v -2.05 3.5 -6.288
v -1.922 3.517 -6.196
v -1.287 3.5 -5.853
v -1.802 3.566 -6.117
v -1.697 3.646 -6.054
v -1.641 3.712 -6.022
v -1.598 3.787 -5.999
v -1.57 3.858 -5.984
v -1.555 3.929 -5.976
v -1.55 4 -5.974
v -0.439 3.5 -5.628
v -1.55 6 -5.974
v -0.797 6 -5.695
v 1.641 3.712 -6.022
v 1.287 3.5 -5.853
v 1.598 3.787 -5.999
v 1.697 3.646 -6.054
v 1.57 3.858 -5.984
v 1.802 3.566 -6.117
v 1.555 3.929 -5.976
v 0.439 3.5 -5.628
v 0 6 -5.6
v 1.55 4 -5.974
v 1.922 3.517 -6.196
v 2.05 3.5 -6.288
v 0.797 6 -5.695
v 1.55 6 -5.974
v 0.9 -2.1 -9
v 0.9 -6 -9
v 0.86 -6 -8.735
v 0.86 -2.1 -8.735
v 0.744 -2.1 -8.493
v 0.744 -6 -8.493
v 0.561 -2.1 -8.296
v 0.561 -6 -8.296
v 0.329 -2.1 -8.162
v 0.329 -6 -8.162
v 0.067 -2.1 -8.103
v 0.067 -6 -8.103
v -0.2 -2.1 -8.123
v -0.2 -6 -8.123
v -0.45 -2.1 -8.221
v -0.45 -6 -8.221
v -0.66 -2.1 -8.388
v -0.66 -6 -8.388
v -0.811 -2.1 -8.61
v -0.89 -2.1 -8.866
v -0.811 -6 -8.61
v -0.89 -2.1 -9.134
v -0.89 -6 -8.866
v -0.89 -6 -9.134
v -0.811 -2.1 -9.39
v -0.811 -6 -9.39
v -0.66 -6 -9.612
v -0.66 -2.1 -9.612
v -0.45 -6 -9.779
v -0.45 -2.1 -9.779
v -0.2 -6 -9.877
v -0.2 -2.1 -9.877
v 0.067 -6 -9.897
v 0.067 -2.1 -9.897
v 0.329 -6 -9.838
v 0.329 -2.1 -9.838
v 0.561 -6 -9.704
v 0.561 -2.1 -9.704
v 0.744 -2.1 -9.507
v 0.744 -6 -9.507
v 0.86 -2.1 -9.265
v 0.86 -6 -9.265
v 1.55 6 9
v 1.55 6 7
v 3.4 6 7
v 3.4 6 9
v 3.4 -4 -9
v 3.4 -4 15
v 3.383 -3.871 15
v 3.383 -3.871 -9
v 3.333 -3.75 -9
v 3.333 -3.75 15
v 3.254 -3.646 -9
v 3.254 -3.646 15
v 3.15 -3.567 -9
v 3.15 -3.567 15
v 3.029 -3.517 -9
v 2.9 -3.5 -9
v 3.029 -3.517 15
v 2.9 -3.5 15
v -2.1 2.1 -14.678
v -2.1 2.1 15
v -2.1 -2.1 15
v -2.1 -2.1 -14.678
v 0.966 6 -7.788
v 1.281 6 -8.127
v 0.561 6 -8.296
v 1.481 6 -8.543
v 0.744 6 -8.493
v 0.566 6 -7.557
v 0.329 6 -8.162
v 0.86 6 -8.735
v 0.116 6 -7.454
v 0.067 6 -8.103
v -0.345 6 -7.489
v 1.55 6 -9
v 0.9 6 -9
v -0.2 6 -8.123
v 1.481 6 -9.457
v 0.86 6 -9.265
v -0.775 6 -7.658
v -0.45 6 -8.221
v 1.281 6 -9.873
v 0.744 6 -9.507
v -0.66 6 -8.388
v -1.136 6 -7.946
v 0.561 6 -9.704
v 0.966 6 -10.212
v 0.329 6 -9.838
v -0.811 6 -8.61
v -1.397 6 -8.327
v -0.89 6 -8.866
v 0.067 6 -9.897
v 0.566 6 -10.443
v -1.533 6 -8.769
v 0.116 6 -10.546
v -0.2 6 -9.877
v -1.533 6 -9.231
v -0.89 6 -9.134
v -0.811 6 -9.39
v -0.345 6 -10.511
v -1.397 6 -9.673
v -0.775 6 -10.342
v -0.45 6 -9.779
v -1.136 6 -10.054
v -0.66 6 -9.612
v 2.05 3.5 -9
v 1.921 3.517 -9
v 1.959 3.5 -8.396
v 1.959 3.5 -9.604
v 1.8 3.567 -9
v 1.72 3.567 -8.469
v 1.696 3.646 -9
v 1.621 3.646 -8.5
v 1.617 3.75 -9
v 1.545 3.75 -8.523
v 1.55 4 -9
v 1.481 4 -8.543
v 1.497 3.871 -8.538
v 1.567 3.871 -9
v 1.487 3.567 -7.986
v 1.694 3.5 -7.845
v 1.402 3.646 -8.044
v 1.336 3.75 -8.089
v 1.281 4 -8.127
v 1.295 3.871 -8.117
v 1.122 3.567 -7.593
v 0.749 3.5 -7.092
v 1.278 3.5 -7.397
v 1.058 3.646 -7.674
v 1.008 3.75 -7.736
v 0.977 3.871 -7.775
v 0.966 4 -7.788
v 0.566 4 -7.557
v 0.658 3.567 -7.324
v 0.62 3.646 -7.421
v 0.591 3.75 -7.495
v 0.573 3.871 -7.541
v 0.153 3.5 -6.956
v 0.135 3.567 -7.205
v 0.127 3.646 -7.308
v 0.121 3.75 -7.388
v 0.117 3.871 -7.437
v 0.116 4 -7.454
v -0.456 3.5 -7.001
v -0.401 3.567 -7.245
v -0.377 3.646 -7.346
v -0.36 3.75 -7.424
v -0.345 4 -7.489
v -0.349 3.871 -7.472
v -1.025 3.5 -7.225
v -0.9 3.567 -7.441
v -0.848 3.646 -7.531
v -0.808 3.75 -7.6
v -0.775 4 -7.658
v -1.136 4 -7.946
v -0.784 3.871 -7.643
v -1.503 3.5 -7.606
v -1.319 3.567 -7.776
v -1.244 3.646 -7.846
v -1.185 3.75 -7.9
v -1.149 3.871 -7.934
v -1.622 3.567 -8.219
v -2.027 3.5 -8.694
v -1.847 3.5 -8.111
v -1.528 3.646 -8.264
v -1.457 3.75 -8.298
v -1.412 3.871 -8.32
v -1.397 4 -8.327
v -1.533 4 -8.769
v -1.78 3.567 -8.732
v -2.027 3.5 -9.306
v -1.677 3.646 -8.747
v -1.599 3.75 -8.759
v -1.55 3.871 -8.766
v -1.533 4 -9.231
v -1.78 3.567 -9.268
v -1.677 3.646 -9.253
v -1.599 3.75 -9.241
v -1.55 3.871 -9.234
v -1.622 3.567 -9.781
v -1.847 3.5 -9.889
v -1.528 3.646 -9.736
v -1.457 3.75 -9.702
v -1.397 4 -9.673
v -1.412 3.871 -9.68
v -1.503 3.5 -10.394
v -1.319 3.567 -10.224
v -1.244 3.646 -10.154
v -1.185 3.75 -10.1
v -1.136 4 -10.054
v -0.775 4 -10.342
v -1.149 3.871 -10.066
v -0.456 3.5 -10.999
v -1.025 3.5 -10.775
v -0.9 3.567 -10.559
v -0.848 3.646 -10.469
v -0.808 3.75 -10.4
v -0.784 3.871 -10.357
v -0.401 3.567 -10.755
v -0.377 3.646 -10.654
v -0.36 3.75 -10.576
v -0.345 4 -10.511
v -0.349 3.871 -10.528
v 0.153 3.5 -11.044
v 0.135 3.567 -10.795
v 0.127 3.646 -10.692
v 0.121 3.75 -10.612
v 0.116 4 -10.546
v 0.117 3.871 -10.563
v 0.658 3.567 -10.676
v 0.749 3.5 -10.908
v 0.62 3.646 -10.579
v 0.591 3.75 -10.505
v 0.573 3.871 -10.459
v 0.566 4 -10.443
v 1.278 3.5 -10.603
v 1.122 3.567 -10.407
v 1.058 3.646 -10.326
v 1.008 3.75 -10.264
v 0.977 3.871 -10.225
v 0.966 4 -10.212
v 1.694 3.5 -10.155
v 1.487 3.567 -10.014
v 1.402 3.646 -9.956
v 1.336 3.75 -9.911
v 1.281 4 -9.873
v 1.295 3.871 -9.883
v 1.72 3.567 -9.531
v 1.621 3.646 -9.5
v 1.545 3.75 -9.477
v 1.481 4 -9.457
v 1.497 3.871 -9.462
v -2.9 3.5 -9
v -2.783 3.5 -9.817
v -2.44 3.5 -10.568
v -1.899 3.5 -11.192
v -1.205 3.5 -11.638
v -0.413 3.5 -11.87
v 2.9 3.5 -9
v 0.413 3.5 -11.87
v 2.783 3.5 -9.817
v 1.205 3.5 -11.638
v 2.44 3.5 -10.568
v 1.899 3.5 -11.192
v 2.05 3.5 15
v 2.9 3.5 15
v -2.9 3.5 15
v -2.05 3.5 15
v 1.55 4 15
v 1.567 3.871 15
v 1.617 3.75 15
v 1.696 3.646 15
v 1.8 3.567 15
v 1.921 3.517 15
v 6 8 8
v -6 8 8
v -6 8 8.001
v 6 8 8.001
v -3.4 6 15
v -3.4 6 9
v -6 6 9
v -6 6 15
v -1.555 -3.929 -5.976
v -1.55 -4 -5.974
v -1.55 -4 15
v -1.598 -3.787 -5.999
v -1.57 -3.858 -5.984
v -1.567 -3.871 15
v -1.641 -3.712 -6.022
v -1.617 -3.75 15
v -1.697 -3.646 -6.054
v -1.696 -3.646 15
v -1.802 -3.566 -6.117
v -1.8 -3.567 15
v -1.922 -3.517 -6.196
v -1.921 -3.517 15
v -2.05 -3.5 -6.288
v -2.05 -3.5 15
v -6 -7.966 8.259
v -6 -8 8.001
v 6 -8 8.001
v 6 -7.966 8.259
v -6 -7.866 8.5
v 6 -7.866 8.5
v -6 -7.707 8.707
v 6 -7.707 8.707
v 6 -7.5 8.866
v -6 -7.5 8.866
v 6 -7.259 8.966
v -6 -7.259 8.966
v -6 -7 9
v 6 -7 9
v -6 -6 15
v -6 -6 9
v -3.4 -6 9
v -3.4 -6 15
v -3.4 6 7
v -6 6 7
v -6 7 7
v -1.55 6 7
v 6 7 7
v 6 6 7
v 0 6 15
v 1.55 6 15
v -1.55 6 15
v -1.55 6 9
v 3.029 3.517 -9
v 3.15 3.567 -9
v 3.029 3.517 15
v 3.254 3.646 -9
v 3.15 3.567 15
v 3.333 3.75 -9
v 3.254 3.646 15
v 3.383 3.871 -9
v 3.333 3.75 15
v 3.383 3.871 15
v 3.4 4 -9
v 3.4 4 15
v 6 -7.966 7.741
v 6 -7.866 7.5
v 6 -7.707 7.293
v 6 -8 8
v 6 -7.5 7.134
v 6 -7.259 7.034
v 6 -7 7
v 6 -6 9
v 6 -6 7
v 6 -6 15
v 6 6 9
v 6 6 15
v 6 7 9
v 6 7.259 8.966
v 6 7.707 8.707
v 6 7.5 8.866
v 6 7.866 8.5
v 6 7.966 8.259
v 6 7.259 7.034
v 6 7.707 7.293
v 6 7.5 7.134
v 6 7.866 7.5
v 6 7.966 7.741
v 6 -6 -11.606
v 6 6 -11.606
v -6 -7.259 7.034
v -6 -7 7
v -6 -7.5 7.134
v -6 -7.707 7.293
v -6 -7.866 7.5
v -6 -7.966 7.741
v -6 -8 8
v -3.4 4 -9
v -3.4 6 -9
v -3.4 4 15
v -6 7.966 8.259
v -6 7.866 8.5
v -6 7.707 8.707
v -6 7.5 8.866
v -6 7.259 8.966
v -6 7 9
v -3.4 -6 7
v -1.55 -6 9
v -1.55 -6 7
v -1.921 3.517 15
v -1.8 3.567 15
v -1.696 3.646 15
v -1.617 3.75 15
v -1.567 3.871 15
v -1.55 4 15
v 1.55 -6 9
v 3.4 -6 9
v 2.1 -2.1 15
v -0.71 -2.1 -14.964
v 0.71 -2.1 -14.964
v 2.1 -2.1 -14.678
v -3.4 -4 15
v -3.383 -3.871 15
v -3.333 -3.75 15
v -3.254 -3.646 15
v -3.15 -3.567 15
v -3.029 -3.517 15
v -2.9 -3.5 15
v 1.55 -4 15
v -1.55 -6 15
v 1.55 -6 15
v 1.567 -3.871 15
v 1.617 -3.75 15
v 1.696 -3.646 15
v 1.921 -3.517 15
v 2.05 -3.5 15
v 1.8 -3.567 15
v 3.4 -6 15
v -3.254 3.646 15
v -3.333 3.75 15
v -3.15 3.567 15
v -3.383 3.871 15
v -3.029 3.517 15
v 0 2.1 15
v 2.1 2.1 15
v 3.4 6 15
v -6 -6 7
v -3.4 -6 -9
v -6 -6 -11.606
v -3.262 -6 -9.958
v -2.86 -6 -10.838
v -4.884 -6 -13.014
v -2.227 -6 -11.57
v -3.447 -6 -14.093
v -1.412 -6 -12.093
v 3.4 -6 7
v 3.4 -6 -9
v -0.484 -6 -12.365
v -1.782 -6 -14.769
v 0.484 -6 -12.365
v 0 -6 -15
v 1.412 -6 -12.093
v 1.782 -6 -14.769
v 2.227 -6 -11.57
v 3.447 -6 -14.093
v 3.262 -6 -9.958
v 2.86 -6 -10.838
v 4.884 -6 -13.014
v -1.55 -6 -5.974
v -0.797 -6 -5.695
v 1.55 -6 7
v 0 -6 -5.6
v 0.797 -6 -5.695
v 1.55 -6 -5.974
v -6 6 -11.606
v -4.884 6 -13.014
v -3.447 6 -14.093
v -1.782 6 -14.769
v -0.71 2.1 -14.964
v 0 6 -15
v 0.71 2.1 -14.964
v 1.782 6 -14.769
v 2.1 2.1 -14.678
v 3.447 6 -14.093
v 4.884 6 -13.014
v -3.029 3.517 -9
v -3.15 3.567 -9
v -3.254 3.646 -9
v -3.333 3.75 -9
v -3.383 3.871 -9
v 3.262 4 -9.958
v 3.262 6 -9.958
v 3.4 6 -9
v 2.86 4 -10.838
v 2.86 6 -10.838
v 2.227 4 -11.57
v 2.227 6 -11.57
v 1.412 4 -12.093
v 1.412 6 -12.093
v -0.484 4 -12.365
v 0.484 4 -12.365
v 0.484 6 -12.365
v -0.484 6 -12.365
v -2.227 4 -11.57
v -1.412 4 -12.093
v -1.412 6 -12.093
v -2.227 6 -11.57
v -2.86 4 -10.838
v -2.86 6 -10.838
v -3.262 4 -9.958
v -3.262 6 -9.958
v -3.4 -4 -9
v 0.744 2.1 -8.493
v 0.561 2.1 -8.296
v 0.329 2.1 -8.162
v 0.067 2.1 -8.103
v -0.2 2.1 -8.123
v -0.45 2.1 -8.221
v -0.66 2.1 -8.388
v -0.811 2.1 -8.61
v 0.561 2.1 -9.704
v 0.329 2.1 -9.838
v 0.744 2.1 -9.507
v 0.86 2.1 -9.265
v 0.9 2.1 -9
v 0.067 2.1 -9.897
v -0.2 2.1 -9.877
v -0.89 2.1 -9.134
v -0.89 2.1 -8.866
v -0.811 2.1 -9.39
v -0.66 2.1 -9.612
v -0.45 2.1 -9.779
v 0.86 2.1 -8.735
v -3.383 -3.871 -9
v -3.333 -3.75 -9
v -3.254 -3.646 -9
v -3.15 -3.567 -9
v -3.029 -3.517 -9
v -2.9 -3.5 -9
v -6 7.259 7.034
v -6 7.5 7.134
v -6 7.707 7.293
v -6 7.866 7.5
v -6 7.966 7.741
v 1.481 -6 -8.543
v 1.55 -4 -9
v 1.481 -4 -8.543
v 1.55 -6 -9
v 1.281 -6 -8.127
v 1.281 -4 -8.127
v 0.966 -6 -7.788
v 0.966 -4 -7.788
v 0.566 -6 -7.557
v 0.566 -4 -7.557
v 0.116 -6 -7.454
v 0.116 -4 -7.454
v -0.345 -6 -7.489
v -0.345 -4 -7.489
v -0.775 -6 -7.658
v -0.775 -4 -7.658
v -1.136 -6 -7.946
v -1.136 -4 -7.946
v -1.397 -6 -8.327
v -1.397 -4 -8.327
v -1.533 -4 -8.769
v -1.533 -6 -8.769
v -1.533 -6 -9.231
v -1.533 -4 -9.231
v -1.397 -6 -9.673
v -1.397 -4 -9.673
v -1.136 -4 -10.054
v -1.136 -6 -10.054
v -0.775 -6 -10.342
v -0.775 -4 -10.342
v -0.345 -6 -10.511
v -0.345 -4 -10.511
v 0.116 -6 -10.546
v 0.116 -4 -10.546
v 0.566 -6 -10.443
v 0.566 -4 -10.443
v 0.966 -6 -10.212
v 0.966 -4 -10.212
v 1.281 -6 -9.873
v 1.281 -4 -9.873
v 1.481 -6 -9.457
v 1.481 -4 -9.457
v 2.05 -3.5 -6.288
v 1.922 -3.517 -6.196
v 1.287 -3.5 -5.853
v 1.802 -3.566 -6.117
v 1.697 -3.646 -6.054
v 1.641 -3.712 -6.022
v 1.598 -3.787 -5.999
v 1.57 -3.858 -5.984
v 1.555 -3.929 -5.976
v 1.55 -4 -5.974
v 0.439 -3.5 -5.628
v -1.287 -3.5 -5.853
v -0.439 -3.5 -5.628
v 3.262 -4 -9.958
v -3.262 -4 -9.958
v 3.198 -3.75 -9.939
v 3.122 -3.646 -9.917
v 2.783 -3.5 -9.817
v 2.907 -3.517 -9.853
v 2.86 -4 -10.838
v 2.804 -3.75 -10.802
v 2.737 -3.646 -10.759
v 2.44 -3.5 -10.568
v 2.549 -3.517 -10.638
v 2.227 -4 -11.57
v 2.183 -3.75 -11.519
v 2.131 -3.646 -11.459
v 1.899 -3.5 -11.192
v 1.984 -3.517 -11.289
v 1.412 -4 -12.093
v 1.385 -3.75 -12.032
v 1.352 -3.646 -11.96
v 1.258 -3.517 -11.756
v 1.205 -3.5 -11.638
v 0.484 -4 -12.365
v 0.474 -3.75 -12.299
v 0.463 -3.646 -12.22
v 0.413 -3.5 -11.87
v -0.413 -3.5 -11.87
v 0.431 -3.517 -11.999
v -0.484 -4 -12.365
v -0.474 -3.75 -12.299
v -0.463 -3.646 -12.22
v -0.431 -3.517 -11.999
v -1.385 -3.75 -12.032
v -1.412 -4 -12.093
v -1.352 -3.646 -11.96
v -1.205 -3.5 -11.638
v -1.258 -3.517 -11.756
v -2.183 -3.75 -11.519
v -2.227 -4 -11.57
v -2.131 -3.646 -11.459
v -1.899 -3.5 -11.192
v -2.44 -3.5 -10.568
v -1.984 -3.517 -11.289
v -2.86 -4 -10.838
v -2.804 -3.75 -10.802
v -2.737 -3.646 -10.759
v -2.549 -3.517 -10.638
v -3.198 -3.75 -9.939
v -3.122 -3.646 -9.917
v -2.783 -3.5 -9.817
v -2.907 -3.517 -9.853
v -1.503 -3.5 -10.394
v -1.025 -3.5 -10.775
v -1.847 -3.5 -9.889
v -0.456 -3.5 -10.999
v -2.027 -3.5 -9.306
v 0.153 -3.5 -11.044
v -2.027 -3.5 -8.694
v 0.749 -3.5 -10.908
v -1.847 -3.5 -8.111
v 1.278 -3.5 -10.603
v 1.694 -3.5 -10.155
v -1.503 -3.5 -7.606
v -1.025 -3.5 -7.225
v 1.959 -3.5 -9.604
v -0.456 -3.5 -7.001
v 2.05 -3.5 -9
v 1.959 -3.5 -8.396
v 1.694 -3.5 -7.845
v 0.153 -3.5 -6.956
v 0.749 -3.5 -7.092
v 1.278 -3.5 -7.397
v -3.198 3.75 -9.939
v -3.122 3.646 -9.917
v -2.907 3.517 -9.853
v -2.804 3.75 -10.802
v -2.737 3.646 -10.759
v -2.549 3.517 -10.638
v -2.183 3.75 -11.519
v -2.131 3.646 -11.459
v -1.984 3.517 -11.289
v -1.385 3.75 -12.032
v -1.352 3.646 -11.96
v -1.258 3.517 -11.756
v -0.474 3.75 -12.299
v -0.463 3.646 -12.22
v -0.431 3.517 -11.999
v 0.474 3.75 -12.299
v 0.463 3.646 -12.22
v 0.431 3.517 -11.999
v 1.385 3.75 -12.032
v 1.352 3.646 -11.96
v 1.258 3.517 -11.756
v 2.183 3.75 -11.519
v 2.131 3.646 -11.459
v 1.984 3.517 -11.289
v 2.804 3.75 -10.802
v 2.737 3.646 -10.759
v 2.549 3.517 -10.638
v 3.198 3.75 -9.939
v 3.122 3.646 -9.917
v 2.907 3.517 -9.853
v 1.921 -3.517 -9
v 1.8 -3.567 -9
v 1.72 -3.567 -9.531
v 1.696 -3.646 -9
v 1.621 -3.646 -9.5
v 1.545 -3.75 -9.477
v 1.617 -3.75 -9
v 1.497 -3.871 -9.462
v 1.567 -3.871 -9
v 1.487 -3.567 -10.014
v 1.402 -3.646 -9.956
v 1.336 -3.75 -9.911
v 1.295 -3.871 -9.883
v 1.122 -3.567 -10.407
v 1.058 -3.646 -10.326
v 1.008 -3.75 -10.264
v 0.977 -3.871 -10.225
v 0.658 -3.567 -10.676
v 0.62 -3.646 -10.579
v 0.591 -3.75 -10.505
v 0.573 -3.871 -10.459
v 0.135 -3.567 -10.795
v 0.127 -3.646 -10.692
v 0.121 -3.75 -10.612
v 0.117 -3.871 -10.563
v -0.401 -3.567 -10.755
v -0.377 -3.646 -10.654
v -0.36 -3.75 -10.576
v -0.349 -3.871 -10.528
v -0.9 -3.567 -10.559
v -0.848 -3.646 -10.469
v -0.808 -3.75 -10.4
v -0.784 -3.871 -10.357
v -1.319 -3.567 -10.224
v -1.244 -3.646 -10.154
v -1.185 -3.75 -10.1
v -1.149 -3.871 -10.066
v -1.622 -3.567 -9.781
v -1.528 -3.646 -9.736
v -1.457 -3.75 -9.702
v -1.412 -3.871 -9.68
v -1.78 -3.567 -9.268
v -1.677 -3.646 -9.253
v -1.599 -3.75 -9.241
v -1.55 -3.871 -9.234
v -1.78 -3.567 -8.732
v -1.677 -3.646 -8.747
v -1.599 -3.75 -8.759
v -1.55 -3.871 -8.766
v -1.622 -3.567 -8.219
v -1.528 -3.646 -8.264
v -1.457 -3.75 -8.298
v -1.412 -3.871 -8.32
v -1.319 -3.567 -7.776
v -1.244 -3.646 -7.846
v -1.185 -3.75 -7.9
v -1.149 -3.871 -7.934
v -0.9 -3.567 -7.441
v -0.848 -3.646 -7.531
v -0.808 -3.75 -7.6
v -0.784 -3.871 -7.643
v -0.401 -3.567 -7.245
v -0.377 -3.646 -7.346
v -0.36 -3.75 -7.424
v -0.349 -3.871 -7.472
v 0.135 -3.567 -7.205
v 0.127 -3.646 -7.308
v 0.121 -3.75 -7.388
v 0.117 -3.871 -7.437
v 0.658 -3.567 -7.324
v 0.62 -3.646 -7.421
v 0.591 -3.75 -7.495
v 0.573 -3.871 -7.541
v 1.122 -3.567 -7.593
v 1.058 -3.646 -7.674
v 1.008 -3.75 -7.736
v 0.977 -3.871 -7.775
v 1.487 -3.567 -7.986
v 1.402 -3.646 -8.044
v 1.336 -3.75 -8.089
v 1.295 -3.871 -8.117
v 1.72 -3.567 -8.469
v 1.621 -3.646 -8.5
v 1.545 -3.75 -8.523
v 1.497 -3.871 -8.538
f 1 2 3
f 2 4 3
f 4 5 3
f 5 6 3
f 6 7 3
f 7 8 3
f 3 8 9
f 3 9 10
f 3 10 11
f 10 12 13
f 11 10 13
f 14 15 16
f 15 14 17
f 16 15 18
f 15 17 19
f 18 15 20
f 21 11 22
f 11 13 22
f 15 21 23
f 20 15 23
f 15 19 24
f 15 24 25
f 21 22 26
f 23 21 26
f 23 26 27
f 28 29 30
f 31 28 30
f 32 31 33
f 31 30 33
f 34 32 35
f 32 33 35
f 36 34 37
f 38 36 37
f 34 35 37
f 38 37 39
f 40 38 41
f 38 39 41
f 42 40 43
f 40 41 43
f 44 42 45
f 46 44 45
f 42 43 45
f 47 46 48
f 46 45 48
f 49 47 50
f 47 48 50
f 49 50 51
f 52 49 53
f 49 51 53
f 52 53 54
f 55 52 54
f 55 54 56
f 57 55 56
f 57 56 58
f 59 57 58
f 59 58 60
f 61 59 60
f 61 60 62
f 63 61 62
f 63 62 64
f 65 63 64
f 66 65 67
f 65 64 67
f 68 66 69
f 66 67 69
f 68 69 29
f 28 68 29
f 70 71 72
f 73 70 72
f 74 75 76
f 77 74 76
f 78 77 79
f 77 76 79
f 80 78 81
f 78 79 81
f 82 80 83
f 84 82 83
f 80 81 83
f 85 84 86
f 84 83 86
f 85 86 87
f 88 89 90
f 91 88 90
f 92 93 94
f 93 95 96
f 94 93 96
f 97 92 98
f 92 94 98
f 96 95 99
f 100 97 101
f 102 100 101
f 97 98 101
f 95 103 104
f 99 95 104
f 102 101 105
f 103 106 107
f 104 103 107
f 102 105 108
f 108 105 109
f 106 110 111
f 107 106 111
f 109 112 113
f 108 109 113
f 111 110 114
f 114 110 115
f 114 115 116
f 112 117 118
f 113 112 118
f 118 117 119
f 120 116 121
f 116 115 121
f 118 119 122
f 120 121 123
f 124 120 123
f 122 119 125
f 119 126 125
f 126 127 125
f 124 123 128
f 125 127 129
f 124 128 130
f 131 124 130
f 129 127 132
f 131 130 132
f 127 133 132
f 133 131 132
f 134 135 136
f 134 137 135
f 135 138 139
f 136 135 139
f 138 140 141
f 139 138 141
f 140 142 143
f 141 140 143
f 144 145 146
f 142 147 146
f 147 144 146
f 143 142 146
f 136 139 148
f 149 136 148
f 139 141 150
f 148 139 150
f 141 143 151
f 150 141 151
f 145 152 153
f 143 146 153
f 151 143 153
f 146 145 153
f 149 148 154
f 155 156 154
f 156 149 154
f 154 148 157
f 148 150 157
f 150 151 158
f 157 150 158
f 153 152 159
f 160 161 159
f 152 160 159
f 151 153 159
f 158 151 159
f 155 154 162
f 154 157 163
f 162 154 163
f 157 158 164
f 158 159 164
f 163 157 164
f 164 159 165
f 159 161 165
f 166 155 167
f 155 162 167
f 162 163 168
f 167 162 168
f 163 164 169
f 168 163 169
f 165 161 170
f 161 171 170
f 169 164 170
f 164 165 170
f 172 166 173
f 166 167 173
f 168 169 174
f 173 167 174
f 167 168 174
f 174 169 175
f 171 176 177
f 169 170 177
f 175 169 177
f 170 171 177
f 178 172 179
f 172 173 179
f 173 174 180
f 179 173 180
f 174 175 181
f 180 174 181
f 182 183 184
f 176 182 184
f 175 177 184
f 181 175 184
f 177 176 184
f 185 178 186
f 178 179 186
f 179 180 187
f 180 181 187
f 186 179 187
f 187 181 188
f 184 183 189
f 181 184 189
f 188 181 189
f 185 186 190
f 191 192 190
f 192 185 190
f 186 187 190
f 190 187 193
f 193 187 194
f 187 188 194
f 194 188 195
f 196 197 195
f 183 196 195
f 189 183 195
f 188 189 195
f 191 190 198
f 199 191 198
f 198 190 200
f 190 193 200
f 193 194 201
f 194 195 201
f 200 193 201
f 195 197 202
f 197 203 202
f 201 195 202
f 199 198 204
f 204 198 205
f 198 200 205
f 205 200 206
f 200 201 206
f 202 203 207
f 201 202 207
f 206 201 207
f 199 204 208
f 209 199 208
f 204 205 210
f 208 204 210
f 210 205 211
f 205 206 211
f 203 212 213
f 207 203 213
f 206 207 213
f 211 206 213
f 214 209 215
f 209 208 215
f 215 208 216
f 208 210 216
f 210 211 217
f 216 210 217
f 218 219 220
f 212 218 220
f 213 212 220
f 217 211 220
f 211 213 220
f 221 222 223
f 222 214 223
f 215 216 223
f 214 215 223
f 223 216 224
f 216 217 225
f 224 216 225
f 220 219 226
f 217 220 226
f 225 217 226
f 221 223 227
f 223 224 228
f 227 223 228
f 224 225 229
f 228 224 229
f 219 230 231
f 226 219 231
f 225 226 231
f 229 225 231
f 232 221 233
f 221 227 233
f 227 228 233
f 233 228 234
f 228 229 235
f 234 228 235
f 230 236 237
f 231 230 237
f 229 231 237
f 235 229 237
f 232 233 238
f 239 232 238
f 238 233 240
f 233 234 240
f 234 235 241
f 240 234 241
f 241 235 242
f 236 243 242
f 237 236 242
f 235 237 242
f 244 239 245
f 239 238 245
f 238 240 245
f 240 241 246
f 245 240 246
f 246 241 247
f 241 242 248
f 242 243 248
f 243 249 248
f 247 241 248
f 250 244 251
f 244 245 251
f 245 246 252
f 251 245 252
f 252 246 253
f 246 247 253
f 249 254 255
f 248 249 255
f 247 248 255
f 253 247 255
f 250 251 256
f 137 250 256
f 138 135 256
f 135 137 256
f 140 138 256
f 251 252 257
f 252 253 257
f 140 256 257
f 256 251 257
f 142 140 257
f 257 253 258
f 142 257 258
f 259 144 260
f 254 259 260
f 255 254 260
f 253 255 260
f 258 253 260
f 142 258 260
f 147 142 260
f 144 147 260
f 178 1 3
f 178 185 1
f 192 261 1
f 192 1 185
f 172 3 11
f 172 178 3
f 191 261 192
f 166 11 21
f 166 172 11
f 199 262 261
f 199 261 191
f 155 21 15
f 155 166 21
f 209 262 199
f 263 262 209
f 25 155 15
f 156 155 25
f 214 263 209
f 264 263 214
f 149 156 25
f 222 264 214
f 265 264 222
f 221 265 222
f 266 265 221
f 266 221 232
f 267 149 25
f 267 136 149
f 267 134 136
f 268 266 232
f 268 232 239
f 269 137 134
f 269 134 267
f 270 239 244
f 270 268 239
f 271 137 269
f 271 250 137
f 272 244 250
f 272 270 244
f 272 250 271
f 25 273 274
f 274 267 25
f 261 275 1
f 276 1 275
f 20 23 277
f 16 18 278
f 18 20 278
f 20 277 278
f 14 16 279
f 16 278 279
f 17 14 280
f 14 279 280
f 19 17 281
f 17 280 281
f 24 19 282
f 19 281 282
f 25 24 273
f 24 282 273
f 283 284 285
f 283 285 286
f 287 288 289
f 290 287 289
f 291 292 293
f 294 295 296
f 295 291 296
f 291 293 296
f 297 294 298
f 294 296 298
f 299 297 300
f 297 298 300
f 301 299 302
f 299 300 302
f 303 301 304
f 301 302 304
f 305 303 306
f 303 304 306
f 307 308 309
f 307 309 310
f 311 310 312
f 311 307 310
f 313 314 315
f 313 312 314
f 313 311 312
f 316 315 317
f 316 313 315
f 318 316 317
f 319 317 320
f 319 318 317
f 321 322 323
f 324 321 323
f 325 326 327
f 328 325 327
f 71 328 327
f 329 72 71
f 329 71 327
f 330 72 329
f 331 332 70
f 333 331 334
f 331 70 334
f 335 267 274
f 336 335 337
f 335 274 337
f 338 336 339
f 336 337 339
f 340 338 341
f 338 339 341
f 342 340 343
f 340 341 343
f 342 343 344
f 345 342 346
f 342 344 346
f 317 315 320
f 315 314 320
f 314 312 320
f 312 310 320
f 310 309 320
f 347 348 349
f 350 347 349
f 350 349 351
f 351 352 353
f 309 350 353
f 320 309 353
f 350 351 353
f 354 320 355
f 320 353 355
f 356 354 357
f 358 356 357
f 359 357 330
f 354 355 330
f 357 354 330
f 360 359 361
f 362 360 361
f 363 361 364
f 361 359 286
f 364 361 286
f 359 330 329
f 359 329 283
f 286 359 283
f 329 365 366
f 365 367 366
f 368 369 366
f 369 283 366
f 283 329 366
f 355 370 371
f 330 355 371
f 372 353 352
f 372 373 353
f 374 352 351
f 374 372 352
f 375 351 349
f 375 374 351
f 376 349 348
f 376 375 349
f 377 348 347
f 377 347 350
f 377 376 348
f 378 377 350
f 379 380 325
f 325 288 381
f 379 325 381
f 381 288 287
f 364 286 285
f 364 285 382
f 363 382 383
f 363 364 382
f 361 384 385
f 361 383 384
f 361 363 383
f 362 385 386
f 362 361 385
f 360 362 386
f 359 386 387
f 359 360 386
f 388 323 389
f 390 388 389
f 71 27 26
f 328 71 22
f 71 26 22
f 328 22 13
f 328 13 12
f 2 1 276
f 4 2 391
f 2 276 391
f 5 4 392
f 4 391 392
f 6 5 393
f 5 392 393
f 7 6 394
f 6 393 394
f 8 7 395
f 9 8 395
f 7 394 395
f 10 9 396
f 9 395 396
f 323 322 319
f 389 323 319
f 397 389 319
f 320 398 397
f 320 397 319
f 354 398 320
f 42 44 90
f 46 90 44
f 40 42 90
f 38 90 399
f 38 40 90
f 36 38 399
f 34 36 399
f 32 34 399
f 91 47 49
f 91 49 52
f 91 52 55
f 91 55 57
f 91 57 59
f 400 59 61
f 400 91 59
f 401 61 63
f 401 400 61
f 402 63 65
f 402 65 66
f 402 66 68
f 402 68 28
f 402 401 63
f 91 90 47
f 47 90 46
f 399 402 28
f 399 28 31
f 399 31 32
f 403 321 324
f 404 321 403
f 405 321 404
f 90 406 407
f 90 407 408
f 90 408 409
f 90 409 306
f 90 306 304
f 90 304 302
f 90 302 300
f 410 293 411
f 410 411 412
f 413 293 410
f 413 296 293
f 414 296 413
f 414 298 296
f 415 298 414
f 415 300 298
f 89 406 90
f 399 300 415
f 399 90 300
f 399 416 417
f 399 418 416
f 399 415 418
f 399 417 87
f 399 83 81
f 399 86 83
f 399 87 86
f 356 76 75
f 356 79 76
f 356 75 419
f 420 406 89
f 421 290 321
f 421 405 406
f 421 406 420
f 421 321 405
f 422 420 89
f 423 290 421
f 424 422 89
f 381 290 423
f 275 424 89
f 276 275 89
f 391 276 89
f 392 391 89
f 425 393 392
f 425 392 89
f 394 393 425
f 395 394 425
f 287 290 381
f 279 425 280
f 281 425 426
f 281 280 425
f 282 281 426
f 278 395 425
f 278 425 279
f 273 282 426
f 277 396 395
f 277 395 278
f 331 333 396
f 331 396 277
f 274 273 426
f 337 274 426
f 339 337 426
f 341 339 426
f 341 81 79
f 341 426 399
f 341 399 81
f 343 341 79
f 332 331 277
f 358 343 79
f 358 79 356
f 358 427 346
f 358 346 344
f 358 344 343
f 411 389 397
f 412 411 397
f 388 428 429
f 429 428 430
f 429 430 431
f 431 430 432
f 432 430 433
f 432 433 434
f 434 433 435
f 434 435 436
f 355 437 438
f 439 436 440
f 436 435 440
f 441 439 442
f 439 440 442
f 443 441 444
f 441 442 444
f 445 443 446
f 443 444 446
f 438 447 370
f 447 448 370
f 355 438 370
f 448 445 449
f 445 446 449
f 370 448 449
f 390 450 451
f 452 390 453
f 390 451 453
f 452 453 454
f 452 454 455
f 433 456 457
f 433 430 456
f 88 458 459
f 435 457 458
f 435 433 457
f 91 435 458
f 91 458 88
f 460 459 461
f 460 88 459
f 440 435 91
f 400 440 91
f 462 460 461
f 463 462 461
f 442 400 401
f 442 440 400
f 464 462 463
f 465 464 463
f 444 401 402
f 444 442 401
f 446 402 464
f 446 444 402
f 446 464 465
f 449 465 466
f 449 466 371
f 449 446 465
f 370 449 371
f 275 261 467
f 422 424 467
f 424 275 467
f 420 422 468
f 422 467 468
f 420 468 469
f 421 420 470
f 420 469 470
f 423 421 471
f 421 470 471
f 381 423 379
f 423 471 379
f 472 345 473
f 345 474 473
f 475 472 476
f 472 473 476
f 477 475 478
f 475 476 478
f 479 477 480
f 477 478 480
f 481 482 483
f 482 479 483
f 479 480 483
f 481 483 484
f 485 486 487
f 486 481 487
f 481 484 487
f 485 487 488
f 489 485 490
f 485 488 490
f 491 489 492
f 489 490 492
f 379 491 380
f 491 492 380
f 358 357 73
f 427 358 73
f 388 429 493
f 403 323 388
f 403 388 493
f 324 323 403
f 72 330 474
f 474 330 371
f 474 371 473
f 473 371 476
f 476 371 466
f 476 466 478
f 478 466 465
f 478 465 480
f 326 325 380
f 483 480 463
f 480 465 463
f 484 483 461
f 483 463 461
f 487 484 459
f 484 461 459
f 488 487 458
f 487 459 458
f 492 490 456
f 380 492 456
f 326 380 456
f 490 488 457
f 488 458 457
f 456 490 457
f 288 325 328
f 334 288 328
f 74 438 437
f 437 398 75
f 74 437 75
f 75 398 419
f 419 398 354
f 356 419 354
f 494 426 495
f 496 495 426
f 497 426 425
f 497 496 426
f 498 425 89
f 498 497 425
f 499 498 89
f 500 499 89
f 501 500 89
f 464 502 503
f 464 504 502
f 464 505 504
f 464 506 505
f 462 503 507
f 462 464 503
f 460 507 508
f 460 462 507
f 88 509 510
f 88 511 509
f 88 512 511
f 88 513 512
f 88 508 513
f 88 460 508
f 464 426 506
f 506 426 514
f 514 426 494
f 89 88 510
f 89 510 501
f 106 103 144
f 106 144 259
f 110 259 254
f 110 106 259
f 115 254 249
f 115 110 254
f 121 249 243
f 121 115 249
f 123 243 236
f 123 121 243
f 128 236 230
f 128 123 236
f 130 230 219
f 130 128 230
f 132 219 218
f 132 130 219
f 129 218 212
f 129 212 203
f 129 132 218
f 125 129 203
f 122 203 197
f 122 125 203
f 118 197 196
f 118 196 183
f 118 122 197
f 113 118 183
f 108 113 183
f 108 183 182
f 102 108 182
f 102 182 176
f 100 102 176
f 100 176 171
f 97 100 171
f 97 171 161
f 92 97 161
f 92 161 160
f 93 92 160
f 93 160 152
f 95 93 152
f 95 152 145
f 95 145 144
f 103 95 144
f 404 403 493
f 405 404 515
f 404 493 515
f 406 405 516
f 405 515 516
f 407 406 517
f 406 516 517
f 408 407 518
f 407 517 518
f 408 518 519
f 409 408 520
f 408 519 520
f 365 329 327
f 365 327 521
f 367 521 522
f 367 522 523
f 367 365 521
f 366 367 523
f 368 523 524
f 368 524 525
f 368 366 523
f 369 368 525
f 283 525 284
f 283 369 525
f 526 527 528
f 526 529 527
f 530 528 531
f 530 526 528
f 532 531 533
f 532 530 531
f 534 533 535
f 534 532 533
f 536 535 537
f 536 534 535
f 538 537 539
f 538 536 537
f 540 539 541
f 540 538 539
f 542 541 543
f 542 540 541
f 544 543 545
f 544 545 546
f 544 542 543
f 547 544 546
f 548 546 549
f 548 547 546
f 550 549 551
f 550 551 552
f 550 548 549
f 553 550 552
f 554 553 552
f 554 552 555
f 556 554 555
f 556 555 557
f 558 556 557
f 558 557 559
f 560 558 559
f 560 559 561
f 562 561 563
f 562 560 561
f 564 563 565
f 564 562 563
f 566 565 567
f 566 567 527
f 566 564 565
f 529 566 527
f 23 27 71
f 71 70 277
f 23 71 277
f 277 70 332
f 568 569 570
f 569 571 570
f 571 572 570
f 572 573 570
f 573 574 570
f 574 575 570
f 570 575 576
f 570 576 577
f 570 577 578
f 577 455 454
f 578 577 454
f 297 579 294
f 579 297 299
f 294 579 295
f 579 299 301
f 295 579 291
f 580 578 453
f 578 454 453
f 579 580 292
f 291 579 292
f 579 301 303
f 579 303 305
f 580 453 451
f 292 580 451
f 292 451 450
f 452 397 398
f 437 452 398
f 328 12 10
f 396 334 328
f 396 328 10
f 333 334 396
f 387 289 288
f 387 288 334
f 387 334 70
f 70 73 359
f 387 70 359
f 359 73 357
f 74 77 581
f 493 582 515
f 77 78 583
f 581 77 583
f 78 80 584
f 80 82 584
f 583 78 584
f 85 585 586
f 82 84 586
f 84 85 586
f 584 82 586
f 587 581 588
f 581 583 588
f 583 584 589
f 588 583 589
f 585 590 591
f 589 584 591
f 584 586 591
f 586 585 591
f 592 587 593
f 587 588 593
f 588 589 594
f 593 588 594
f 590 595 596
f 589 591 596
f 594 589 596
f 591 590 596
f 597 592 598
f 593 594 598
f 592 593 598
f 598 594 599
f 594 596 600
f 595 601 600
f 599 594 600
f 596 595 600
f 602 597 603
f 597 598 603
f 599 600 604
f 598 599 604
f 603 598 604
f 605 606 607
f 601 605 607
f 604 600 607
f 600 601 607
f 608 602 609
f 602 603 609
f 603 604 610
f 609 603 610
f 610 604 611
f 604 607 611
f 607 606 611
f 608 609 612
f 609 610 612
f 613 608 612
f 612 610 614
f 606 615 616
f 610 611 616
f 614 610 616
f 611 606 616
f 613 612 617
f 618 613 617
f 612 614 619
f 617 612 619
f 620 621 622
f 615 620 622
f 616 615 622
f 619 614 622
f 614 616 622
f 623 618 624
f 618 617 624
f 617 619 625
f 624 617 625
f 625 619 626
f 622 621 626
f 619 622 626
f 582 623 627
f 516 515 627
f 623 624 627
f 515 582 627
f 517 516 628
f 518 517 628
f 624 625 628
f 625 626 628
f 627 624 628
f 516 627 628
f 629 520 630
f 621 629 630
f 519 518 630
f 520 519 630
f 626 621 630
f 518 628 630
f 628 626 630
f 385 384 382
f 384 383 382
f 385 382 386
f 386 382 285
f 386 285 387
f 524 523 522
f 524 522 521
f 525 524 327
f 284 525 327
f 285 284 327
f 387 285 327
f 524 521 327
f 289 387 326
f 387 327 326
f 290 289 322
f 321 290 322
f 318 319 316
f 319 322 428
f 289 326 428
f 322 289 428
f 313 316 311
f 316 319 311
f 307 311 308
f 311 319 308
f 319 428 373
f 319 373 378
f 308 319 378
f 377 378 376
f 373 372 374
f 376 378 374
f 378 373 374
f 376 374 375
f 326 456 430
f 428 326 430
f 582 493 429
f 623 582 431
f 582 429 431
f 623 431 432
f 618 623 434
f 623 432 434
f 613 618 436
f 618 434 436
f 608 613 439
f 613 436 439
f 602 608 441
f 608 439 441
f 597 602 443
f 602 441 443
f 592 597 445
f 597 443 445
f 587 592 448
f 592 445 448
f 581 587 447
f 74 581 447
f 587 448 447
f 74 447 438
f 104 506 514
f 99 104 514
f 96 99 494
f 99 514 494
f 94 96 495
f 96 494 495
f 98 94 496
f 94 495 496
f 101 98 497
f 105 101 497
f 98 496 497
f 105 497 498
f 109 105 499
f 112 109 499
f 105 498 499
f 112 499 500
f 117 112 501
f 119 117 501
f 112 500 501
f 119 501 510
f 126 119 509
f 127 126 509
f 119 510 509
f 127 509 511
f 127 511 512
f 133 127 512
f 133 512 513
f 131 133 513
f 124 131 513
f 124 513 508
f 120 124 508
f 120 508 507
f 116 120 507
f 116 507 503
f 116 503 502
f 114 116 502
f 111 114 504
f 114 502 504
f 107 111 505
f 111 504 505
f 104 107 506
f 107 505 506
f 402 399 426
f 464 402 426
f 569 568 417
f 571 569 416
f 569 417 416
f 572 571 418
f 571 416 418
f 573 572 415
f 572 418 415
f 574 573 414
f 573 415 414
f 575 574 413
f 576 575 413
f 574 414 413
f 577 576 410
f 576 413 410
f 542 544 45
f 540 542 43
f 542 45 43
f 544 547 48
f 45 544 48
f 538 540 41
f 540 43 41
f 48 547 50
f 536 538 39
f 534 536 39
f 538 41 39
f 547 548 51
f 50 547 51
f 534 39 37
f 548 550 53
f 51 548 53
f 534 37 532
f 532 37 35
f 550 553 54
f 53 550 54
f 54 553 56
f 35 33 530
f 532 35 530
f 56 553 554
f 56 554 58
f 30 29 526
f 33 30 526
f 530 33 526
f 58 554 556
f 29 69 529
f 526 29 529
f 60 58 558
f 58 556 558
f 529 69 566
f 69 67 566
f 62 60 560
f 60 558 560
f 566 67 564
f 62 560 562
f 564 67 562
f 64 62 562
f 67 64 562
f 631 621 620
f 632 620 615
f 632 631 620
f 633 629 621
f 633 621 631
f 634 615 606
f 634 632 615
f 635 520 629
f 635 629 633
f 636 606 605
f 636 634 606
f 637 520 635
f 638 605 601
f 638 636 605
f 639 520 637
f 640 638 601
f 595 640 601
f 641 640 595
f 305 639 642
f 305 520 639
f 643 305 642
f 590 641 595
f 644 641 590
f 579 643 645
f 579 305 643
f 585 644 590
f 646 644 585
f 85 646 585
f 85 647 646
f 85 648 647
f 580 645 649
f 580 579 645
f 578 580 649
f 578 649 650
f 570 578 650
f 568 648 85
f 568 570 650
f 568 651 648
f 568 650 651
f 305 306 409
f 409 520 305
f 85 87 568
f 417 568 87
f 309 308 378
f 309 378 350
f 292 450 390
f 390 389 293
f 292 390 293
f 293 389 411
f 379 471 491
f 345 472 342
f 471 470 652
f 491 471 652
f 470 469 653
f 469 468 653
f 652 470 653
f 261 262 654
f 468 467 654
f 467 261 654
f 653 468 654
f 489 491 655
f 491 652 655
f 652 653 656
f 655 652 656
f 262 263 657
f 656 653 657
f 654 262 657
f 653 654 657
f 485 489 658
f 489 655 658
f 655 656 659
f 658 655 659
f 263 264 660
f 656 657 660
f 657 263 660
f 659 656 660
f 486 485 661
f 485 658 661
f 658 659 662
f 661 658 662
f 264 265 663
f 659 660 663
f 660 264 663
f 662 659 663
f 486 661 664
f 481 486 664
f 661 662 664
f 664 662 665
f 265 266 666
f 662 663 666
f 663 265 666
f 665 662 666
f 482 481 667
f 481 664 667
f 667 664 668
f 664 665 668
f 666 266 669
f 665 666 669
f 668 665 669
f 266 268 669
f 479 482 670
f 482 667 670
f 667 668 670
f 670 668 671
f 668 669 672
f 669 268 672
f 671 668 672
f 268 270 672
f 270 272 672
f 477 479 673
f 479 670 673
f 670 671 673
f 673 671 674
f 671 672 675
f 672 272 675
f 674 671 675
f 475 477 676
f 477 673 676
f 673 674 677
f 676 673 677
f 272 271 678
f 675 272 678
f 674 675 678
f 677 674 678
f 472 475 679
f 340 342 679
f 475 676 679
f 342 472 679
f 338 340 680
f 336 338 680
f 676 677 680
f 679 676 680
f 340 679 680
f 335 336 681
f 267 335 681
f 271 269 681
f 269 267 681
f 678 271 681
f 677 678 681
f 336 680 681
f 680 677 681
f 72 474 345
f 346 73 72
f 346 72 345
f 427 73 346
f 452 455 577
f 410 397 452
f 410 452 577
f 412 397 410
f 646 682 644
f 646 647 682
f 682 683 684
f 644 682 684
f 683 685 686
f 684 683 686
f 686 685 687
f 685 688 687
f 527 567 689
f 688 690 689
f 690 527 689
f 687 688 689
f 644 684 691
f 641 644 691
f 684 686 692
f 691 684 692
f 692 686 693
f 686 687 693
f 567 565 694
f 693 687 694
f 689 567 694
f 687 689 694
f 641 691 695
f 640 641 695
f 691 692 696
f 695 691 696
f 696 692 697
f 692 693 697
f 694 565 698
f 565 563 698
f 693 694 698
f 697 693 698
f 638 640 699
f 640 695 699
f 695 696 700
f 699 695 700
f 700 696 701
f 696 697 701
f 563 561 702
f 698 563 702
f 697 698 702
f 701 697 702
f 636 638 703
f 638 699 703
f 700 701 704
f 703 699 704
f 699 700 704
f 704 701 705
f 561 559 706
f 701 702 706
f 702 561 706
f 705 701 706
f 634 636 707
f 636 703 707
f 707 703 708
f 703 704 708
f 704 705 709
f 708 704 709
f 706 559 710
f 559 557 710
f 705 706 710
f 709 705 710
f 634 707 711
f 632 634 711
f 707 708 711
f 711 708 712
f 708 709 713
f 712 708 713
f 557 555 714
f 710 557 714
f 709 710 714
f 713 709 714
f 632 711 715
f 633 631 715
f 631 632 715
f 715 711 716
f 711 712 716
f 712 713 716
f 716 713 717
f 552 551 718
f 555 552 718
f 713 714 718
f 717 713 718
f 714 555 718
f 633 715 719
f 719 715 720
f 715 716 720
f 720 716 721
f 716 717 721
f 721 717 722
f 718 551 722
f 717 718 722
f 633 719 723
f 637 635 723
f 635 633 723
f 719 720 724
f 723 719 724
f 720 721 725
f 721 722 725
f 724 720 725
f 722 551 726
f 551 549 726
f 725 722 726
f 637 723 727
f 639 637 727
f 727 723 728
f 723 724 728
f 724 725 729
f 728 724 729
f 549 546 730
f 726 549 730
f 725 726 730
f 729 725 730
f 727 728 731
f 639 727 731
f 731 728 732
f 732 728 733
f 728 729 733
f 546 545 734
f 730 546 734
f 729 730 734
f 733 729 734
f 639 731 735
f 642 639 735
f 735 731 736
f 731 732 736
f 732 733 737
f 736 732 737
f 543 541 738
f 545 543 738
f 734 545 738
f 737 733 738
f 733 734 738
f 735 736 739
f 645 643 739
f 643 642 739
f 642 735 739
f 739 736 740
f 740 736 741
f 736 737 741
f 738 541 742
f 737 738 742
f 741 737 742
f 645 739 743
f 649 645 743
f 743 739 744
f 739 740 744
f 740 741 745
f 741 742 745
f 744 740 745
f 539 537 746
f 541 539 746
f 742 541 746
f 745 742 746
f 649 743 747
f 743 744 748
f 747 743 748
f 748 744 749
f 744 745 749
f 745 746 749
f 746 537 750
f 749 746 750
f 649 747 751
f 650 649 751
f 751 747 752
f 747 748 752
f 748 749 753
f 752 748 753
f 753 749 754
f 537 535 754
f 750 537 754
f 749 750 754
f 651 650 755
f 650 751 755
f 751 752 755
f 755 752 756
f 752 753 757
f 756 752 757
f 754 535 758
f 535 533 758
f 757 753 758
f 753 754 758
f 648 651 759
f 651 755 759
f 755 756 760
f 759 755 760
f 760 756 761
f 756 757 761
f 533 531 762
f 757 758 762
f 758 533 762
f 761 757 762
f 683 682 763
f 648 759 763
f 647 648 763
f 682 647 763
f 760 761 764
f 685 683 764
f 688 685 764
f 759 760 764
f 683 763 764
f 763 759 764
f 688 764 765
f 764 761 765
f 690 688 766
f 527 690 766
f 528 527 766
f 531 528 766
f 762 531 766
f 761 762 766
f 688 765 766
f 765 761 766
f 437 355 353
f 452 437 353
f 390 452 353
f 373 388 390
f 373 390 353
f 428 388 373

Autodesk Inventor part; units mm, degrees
ref_plane "YZ Plane" through (0, 0, 0) normal (1, 0, 0) x (0, 1, 0)
ref_plane "XY Plane" through (0, 0, 0) normal (0, 0, 1) x (1, 0, 0)
sketch "Sketch1" plane through (0, 0, 0) normal (0, 0, 1) x (1, 0, 0)
  line L0 (-2.1, -2.1) -> (2.1, -2.1)
  line L1 (2.1, -2.1) -> (2.1, 2.1)
  line L2 (2.1, 2.1) -> (-2.1, 2.1)
  line L3 (-2.1, 2.1) -> (-2.1, -2.1)
  line L4 (-2.1, -2.1) -> (2.1, 2.1) construction
  line L5 (2.1, -2.1) -> (-2.1, 2.1) construction
  line L6 (-6, -6) -> (6, -6)
  line L7 (6, -6) -> (6, 6)
  line L8 (6, 6) -> (-6, 6)
  line L9 (-6, 6) -> (-6, -6)
  line L10 (-6, -6) -> (6, 6) construction
  line L11 (6, -6) -> (-6, 6) construction
  line L12 (0, 6) -> (0, 2.1)
  point P0 (0, 0)
  dimension "d0" = 4.2
  dimension "d1" = 4.2
  dimension "d2" = 12
  dimension "d3" = 12
  dimension "d93" = 3.9
extrude "Extrusion1" add sketch "Sketch1" along normal mid plane 30
sketch "Sketch2" plane through (-6, 6, 15) normal (0, 1, 0) x (1, 0, 0)
  line L0 (0, 30) -> (0, 0) projected
  line L1 (0, 0) -> (0, 6)
  line L2 (0, 0) -> (0, 8)
  line L3 (0, 6) -> (12, 6)
  line L4 (12, 30) -> (12, 0) projected
  line L5 (0, 8) -> (12, 8)
  line L6 (12, 6) -> (12, 8)
  point P0 (6, 15)
  dimension "d6" = 6
  dimension "d7" = 8
  dimension "d8" = 2
extrude "Extrusion2" add sketch "Sketch2" along normal blind 2
sketch "Sketch3" plane through (-6, 6, -15) normal (0, 1, 0) x (1, 0, 0)
  line L0 (0, 0) -> (0, -30) projected
  line L1 (12, -30) -> (12, 0) projected
  line L2 (0, 0) -> (0, -22) projected
  line L3 (12, -30) -> (0, -30) projected
  line L4 (9.1, -31) -> (2.9, -31)
  line L5 (6, -6) -> (6, 0)
  circle A0 centre (6, -6) radius 1.55
  line L6 (2.8, -31) -> (4, -31)
  line L7 (9.2, -31) -> (8, -31)
  circle A1 centre (6, -6) radius 3.4
  line L8 (2.6, -6) -> (2.6, -31)
  line L9 (2.6, -6) -> (27.6, -6) construction
  line L10 (2.6, -31) -> (4, -31)
  line L11 (9.4, -6) -> (9.4, -31)
  line L12 (9.4, -6) -> (34.4, -6) construction
  line L13 (9.4, -31) -> (8, -31)
  line L14 (4.45, -6) -> (4.45, -31)
  line L15 (4.45, -6) -> (29.45, -6) construction
  line L16 (7.55, -6) -> (7.55, -31)
  line L17 (7.55, -6) -> (32.55, -6) construction
  point P0 (6, -15)
  point P1 (9.4, -30)
  point P2 (2.6, -30)
  point P3 (4.45, -30)
  point P4 (4.45, -9.0261)
  point P5 (7.55, -9.0261)
  point P6 (7.55, -30)
  dimension "d139" = 6
  dimension "d145" = 3.1
  dimension "d183" = 6.8
  dimension "d184" = 90
  dimension "d185" = 90
  dimension "d190" = 90
  dimension "d191" = 90
  dimension "d204" = 6
extrude "Extrusion3" cut sketch "Sketch3" against normal blind 2.5 contours L3 L16 A1 L11 | A1 L16 A0 L5 | L3 L8 A1 L14 | A1 L14 A0 L16 | L5 A0 L14 A1
ref_plane "Work Plane3" through (0, -6, 0) normal (0, 1, 0) x (-1, 0, 0)
sketch "Sketch16" plane through (-6, -6, -15) normal (0, -1, 0) x (1, 0, 0)
  line L0 (12, 0) -> (0, 0) projected
  line L1 (0, 0) -> (6, 0)
  line L2 (6, 0) -> (6, 6)
  circle A0 centre (6, 6) radius 1.55
  arc A1 (7.55, 6) -> (7.55, 6) centre (6, 6) ccw projected
  line L3 (10.2, 6) -> (36.7126, 6) construction
  line L4 (8.95, 32.5126) -> (7.75, 32.5126)
  line L5 (2.8, 6) -> (29.3126, 6) construction
  line L6 (7.55, 6) -> (9.4, 6)
  circle A2 centre (6, 6) radius 3.4
  line L7 (9.4, 6) -> (9.4, 32.5126)
  line L8 (9.4, 6) -> (35.9126, 6) construction
  line L9 (9.4, 32.5126) -> (7.75, 32.5126)
  line L10 (2.6, 6) -> (2.6, 32.5126)
  line L11 (2.6, 6) -> (29.1126, 6) construction
  line L12 (7.55, 6) -> (7.55, 32.5126)
  line L13 (7.55, 6) -> (34.0626, 6) construction
  line L14 (7.55, 32.5126) -> (9.4, 32.5126)
  line L15 (4.45, 6) -> (4.45, 32.5126)
  line L16 (4.45, 6) -> (30.9626, 6) construction
  line L17 (4.45, 32.5126) -> (2.6, 32.5126)
  point P0 (10.1, 6)
  point P1 (4.45, 9.0261)
  point P2 (7.55, 9.0261)
  dimension "d155" = 6
  dimension "d156" = 6
  dimension "d181" = 90
  dimension "d182" = 90
  dimension "d187" = 3.1
  dimension "d188" = 90
  dimension "d189" = 90
  dimension "d198" = 6.8
extrude "Extrusion12" cut sketch "Sketch16" against normal blind 2.5 contours A2 L15 A0 L2 | L2 A0 L6 A2 | L10 L17 L15 A2 | L6 L12 A2 | A2 L12 L14 L4 L9 L7 | L15 A2 L12 A0
sketch "Sketch17" plane through (0, -6, -9) normal (0, -1, 0) x (1, 0, 0)
  circle A0 centre (0, 0) radius 0.9
  point P0 (0, 9)
  point P1 (3.1, 0)
  dimension "d186" = 1.8
extrude "Extrusion13" cut sketch "Sketch17" against normal through all
sketch "Sketch18" plane through (0, -6, -9) normal (0, -1, 0) x (1, 0, 0)
  line L0 (0, 0) -> (0, 1)
  arc A0 (-7, 1) -> (7, 1) centre (0, 1) ccw
  line L1 (0, 1) -> (7, 1)
  line L2 (0, 1) -> (-7, 1)
  line L3 (7, 1) -> (7, -9.6793)
  line L4 (7, -9.6793) -> (-7, -9.6793)
  line L5 (-7, -9.6793) -> (-7, 1)
  point P0 (0, 9)
  dimension "d167" = 1
extrude "Extrusion14" cut sketch "Sketch18" against normal through all contours A0 L3 L4 L5
fillet "Fillet11" radius 1 2 edges at (0, 8, 7) (0, 8, 9)
fillet "Fillet12" radius 0.5 12 edges at (3.4, 3.5, 3) (-3.4, 3.5, 3) (0, 3.5, -12.4) (-1.55, 3.5, -9) (1.55, 3.5, 4.5131) (-1.55, 3.5, 4.5131) (0, -3.5, -12.4) (3.4, -3.5, 3) (-3.4, -3.5, 3) (-1.55, -3.5, -9) (1.55, -3.5, 4.5131) (-1.55, -3.5, 4.5131)
sketch "Sketch19" plane through (0, -6, -9) normal (0, -1, 0) x (1, 0, 0)
  line L0 (0, 0) -> (0, 24)
  line L1 (1.55, 24) -> (-1.55, 24) projected
  line L2 (3.4, 24) -> (6, 24) projected
  line L3 (0, 24) -> (6, 24)
  line L4 (6, 24) -> (6, 18)
  line L5 (3.4, 16) -> (6, 16) projected
  line L6 (-6, 16) -> (-3.4, 16) projected
  line L7 (6, 16) -> (-6, 16)
  line L8 (-6, 16) -> (-6, 18) projected
  line L9 (-6, 16) -> (-6, 18)
  line L10 (-6, 18) -> (6, 18)
  line L11 (6, 18) -> (6, 15.7444)
  point P0 (0, 9)
  point P1 (6, 16)
  point P2 (-3.4, 16)
  point P3 (3.4, 16)
  dimension "d194" = 6
extrude "Extrusion15" add sketch "Sketch19" along normal blind 2 contours L7 L6 L8 L10 L0 | L0 L10 L11 L5 L7
fillet "Fillet13" radius 1 2 edges at (0, -8, 7) (0, -8, 9)
properties part number "Nedre del av kne proto1"
